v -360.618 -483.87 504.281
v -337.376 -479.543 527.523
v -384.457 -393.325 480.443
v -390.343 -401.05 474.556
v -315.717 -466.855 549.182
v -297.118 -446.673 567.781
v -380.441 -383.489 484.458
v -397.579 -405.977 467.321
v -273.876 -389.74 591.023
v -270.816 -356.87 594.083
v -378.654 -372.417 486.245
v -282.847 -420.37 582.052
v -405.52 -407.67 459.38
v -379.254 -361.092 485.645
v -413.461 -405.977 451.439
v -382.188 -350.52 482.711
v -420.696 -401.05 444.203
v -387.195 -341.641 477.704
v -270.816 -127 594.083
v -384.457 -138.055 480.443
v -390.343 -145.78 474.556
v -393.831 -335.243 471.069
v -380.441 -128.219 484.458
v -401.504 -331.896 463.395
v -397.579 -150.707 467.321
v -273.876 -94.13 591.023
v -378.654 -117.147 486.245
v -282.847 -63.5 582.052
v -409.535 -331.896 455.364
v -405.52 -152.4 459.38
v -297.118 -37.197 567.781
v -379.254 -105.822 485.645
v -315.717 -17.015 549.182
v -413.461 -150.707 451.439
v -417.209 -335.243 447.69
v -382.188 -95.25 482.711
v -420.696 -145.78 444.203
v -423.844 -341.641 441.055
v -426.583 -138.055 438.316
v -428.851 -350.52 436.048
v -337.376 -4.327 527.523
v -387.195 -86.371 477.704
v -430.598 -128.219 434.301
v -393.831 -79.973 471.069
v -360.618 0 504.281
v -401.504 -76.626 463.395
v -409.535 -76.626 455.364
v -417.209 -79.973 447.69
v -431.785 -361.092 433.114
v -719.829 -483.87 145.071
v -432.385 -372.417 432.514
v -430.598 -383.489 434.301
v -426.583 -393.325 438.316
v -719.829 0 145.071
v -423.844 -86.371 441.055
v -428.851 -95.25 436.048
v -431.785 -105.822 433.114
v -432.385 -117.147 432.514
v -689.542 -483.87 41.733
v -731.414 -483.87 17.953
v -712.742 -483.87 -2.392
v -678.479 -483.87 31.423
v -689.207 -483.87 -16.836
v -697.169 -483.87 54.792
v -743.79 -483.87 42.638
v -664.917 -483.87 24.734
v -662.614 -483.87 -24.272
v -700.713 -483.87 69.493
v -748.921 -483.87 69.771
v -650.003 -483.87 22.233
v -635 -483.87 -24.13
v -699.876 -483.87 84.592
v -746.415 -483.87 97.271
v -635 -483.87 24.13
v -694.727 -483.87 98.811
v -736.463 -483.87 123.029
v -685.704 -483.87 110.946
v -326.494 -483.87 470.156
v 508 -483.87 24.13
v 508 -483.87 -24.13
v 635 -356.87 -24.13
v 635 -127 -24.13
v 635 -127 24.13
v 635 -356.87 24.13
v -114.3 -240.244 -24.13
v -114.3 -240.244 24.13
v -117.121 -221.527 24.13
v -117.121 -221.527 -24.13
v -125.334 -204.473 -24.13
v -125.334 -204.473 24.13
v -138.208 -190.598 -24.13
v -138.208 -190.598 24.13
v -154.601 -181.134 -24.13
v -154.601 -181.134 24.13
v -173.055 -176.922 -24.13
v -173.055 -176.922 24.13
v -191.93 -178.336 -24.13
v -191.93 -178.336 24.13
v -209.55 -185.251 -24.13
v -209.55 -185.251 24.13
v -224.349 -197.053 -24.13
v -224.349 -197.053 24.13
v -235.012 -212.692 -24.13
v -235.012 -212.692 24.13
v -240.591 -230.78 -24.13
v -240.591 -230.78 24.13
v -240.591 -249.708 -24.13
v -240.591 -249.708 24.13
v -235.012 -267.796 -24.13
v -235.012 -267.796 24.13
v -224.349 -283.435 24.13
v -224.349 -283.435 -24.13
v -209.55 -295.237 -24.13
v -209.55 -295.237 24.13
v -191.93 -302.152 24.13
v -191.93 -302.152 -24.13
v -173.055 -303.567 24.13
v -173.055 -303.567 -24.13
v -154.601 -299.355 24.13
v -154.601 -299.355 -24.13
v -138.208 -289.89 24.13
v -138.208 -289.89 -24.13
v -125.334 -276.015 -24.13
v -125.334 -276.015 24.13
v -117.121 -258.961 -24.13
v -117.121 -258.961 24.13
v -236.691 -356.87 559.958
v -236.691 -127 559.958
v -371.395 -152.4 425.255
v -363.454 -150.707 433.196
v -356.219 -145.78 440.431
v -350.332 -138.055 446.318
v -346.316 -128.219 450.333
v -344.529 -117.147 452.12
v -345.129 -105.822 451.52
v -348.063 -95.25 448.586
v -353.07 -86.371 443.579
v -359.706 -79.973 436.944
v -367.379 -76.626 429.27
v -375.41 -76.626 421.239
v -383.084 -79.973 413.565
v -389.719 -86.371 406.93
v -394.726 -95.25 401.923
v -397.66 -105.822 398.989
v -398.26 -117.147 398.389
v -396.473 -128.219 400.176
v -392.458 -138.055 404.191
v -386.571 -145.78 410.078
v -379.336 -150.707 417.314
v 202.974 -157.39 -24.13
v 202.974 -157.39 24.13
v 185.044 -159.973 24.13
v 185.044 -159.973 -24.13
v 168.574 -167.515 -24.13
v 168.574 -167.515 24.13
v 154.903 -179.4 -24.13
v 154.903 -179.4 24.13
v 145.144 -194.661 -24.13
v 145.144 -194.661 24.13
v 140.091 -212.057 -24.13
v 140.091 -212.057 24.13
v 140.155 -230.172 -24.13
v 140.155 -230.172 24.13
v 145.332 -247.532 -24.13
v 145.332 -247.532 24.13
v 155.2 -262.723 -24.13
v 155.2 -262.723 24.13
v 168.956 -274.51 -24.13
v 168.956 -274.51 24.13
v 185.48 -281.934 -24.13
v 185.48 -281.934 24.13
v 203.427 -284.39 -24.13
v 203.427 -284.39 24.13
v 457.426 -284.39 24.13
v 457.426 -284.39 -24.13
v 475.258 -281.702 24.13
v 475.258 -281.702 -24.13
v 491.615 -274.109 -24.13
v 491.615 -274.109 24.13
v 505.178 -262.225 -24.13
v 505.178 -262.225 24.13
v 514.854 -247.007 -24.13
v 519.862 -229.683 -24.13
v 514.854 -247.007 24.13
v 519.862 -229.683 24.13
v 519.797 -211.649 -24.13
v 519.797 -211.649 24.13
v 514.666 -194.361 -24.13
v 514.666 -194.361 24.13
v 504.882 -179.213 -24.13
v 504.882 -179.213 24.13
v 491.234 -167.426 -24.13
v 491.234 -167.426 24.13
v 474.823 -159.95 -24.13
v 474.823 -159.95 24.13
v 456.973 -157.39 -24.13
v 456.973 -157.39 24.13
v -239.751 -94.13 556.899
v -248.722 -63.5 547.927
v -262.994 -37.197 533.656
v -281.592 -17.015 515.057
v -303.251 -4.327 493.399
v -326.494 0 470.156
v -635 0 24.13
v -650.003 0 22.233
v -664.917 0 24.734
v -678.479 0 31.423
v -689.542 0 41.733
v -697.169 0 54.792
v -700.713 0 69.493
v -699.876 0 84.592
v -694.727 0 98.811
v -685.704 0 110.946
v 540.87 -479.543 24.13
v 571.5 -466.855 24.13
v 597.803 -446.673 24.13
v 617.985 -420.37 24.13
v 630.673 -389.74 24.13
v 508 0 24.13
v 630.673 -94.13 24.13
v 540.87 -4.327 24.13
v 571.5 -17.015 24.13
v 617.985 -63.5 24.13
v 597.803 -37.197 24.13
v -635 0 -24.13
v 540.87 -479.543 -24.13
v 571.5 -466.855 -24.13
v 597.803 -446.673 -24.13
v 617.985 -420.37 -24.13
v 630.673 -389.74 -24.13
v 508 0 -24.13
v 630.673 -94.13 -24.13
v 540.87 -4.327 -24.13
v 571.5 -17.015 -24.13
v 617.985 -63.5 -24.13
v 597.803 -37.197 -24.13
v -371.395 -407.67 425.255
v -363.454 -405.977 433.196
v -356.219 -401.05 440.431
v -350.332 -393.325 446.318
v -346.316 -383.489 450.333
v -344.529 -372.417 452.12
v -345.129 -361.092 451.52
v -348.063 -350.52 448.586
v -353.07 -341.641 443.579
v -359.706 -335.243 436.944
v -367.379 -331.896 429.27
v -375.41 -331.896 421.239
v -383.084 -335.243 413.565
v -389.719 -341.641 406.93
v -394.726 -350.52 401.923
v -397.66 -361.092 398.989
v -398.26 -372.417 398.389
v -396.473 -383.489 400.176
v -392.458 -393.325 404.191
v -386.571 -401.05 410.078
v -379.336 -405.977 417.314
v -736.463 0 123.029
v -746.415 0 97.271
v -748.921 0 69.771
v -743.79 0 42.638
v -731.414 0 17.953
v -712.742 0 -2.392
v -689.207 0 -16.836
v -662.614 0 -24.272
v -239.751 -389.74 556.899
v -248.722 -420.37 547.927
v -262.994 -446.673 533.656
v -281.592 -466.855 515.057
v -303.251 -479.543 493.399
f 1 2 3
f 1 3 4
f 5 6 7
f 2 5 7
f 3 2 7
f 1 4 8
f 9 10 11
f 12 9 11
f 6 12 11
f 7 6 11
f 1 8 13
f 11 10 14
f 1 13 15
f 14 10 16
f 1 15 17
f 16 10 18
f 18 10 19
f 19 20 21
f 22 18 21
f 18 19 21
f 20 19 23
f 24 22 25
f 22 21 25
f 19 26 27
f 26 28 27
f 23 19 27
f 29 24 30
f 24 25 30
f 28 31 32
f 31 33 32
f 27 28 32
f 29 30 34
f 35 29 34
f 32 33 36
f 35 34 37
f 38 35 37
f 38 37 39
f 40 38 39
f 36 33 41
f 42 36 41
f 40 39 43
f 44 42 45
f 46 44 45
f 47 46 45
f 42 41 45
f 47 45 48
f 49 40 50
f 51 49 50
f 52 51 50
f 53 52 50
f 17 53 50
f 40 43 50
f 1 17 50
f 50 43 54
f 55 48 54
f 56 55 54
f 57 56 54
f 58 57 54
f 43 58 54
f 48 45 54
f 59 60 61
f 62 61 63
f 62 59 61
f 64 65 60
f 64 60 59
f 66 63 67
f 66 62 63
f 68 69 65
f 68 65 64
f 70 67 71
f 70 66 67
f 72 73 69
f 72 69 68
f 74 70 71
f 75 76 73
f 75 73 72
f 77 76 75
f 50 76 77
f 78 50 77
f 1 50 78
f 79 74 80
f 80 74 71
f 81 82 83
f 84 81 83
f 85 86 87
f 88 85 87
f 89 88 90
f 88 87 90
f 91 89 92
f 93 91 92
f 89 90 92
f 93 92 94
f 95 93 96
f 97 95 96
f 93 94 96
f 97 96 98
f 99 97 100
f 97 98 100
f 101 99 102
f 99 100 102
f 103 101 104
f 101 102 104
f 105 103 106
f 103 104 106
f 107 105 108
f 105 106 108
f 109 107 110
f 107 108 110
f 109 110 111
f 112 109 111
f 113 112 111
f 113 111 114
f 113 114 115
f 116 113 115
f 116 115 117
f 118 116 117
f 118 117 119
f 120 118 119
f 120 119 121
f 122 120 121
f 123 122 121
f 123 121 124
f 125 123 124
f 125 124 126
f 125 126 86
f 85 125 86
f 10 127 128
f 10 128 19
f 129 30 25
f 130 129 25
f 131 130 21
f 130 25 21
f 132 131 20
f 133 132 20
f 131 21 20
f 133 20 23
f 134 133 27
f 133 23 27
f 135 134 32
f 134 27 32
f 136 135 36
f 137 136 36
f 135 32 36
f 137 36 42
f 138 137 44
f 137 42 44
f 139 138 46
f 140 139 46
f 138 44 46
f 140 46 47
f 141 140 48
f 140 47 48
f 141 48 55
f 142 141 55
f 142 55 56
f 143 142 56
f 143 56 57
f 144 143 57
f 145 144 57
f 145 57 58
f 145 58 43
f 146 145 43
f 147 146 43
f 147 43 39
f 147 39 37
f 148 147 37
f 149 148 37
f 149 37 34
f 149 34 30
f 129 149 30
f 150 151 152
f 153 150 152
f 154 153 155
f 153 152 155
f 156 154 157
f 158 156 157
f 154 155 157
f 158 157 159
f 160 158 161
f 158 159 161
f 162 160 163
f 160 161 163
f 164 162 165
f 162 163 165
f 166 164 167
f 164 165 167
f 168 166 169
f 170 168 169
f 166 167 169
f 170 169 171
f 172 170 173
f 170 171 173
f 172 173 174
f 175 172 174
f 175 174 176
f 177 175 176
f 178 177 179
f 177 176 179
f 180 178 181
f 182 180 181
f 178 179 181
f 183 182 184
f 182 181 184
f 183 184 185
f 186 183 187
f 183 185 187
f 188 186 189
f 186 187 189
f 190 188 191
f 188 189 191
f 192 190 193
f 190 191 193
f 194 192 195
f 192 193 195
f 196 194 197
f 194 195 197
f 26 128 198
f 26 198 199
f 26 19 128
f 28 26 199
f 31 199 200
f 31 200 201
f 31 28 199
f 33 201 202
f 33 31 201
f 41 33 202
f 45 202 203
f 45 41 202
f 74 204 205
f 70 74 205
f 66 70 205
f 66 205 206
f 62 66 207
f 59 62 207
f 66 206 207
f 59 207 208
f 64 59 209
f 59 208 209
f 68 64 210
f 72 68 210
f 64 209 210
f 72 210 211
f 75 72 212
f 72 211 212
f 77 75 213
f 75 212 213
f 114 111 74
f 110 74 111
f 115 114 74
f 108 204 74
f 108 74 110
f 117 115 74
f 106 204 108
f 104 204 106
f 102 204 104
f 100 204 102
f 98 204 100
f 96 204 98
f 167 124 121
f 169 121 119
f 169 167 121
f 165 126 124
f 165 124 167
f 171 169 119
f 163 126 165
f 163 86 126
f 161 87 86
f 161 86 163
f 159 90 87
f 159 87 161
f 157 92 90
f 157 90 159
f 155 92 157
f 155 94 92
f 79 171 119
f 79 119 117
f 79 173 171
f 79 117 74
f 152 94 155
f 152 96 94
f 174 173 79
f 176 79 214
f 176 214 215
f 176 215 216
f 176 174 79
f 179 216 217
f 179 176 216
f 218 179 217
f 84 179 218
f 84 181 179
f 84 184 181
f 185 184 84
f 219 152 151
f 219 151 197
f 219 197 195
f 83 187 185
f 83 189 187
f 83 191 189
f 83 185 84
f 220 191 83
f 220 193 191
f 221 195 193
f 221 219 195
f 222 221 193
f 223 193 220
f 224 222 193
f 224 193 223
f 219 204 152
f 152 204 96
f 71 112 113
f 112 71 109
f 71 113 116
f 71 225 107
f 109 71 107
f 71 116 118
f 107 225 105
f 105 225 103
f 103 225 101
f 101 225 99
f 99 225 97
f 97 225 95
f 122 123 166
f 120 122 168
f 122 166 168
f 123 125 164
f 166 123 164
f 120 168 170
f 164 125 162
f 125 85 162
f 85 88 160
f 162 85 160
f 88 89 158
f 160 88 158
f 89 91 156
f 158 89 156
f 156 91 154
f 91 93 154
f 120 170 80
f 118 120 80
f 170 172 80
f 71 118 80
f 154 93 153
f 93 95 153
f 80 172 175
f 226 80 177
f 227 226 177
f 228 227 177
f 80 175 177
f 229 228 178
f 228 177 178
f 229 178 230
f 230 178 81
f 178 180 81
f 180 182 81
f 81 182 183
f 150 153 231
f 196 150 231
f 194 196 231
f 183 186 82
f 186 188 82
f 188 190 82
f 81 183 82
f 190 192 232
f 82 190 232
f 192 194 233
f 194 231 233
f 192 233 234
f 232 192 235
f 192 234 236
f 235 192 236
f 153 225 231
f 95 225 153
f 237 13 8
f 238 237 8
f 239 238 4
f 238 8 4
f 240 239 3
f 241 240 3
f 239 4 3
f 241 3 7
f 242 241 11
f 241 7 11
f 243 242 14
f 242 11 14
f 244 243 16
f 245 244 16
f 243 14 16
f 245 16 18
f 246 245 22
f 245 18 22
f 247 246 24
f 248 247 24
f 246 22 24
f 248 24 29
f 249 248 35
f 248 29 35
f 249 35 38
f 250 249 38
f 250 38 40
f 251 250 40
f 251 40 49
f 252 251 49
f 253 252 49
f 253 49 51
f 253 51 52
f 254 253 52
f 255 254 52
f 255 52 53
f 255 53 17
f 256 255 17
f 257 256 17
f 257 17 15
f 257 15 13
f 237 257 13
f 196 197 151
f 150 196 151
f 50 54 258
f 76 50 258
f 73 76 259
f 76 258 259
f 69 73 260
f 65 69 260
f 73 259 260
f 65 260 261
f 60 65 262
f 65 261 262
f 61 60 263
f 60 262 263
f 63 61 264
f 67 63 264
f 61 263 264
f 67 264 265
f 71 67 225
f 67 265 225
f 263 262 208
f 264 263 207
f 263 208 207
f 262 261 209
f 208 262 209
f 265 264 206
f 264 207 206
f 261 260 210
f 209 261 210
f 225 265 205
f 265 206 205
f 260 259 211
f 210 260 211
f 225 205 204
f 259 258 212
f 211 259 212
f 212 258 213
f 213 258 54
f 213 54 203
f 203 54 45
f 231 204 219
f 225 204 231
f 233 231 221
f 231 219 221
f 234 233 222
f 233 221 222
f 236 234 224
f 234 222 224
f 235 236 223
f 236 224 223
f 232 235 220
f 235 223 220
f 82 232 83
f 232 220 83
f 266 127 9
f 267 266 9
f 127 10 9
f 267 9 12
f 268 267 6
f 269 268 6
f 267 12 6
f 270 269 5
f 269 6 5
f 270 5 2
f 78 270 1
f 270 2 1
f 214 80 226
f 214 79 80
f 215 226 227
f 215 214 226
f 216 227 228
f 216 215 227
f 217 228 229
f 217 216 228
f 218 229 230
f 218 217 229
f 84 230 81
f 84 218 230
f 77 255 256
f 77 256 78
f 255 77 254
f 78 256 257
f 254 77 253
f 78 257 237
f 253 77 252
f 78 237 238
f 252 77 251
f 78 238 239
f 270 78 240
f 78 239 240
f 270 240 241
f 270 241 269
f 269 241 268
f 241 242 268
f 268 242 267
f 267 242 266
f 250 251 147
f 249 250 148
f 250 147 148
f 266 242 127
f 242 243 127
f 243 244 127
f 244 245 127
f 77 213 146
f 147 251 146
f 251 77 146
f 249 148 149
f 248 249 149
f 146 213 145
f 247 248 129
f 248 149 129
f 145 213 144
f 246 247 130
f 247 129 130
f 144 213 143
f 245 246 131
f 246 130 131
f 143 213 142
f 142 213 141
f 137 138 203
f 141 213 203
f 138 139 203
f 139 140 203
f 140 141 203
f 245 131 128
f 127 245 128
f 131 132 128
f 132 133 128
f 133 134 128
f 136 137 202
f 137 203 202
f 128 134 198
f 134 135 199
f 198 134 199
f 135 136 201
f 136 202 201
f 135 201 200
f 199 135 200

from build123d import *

# Parameters (mm, degrees)
F0_W     = 1270
F0_H     = 48.26
F1_DEPTH = 483.87
F2_R     = 127
F3_R     = 38.1
F4_DEPTH = 127
F5_R     = 63.5
F6_DEPTH = 50.8
F7_R     = 127


with BuildPart() as f1:
    # F0 (on Front) → F1 (new body)
    with BuildSketch(Plane.XZ):
        Rectangle(F0_W, F0_H)
        with BuildLine():
            ThreePointArc((-719.8287257737, 145.0706344887), (-738.4602241468, 29.8649791492), (-635, -24.13))
            Line((-635, -24.13), (-635, 24.13))
            ThreePointArc((-635, 24.13), (-693.8326988086, 47.9837165686), (-685.7037525136, 110.9456612286))
            Line((-685.7037525136, 110.9456612286), (-236.6909464602, 559.9584672821))
            Line((-236.6909464602, 559.9584672821), (-270.8159197202, 594.0834405421))
            Line((-270.8159197202, 594.0834405421), (-719.8287257737, 145.0706344887))
        make_face()
    extrude(amount=F1_DEPTH)

    # F2
    f2_edges = [f1.edges().sort_by_distance(p)[0] for p in [
        (-253.753433, -483.87, 577.020954),
        (-253.753433, 0, 577.020954),
    ]]
    fillet(f2_edges, radius=F2_R)

    # F3 (on face) → F4 (cut)
    with BuildSketch(Plane(origin=(-432.4496801312, 0, 432.4496801312), x_dir=(0, -1, 0), z_dir=(-0.7071067812, 0, 0.7071067812))):
        with Locations((114.3, 38.0846561105)):
            Circle(F3_R)
        with Locations((369.57, 38.0846561105)):
            Circle(F3_R)
    extrude(amount=-F4_DEPTH, mode=Mode.SUBTRACT)

    # F5 (on face) → F6 (cut)
    with BuildSketch(Plane.XY.offset(24.13)):
        with BuildLine():
            Line((203.4274212449, -284.3895672825), (457.4258095673, -284.3895672825))
            ThreePointArc((457.4258095673, -284.3895672825), (520.472977332, -220.663759187), (456.9725787551, -157.3895672825))
            Line((456.9725787551, -157.3895672825), (202.9741904327, -157.3895672825))
            ThreePointArc((202.9741904327, -157.3895672825), (139.4737860676, -221.1169928646), (203.4274212449, -284.3895672825))
        make_face()
        with Locations((-177.8, -240.2440756559)):
            Circle(F5_R)
    extrude(amount=-F6_DEPTH, mode=Mode.SUBTRACT)

    # F7
    f7_edges = [f1.edges().sort_by_distance(p)[0] for p in [
        (635, -483.87, 0),
        (635, 0, 0),
    ]]
    fillet(f7_edges, radius=F7_R)


solid = f1.part
